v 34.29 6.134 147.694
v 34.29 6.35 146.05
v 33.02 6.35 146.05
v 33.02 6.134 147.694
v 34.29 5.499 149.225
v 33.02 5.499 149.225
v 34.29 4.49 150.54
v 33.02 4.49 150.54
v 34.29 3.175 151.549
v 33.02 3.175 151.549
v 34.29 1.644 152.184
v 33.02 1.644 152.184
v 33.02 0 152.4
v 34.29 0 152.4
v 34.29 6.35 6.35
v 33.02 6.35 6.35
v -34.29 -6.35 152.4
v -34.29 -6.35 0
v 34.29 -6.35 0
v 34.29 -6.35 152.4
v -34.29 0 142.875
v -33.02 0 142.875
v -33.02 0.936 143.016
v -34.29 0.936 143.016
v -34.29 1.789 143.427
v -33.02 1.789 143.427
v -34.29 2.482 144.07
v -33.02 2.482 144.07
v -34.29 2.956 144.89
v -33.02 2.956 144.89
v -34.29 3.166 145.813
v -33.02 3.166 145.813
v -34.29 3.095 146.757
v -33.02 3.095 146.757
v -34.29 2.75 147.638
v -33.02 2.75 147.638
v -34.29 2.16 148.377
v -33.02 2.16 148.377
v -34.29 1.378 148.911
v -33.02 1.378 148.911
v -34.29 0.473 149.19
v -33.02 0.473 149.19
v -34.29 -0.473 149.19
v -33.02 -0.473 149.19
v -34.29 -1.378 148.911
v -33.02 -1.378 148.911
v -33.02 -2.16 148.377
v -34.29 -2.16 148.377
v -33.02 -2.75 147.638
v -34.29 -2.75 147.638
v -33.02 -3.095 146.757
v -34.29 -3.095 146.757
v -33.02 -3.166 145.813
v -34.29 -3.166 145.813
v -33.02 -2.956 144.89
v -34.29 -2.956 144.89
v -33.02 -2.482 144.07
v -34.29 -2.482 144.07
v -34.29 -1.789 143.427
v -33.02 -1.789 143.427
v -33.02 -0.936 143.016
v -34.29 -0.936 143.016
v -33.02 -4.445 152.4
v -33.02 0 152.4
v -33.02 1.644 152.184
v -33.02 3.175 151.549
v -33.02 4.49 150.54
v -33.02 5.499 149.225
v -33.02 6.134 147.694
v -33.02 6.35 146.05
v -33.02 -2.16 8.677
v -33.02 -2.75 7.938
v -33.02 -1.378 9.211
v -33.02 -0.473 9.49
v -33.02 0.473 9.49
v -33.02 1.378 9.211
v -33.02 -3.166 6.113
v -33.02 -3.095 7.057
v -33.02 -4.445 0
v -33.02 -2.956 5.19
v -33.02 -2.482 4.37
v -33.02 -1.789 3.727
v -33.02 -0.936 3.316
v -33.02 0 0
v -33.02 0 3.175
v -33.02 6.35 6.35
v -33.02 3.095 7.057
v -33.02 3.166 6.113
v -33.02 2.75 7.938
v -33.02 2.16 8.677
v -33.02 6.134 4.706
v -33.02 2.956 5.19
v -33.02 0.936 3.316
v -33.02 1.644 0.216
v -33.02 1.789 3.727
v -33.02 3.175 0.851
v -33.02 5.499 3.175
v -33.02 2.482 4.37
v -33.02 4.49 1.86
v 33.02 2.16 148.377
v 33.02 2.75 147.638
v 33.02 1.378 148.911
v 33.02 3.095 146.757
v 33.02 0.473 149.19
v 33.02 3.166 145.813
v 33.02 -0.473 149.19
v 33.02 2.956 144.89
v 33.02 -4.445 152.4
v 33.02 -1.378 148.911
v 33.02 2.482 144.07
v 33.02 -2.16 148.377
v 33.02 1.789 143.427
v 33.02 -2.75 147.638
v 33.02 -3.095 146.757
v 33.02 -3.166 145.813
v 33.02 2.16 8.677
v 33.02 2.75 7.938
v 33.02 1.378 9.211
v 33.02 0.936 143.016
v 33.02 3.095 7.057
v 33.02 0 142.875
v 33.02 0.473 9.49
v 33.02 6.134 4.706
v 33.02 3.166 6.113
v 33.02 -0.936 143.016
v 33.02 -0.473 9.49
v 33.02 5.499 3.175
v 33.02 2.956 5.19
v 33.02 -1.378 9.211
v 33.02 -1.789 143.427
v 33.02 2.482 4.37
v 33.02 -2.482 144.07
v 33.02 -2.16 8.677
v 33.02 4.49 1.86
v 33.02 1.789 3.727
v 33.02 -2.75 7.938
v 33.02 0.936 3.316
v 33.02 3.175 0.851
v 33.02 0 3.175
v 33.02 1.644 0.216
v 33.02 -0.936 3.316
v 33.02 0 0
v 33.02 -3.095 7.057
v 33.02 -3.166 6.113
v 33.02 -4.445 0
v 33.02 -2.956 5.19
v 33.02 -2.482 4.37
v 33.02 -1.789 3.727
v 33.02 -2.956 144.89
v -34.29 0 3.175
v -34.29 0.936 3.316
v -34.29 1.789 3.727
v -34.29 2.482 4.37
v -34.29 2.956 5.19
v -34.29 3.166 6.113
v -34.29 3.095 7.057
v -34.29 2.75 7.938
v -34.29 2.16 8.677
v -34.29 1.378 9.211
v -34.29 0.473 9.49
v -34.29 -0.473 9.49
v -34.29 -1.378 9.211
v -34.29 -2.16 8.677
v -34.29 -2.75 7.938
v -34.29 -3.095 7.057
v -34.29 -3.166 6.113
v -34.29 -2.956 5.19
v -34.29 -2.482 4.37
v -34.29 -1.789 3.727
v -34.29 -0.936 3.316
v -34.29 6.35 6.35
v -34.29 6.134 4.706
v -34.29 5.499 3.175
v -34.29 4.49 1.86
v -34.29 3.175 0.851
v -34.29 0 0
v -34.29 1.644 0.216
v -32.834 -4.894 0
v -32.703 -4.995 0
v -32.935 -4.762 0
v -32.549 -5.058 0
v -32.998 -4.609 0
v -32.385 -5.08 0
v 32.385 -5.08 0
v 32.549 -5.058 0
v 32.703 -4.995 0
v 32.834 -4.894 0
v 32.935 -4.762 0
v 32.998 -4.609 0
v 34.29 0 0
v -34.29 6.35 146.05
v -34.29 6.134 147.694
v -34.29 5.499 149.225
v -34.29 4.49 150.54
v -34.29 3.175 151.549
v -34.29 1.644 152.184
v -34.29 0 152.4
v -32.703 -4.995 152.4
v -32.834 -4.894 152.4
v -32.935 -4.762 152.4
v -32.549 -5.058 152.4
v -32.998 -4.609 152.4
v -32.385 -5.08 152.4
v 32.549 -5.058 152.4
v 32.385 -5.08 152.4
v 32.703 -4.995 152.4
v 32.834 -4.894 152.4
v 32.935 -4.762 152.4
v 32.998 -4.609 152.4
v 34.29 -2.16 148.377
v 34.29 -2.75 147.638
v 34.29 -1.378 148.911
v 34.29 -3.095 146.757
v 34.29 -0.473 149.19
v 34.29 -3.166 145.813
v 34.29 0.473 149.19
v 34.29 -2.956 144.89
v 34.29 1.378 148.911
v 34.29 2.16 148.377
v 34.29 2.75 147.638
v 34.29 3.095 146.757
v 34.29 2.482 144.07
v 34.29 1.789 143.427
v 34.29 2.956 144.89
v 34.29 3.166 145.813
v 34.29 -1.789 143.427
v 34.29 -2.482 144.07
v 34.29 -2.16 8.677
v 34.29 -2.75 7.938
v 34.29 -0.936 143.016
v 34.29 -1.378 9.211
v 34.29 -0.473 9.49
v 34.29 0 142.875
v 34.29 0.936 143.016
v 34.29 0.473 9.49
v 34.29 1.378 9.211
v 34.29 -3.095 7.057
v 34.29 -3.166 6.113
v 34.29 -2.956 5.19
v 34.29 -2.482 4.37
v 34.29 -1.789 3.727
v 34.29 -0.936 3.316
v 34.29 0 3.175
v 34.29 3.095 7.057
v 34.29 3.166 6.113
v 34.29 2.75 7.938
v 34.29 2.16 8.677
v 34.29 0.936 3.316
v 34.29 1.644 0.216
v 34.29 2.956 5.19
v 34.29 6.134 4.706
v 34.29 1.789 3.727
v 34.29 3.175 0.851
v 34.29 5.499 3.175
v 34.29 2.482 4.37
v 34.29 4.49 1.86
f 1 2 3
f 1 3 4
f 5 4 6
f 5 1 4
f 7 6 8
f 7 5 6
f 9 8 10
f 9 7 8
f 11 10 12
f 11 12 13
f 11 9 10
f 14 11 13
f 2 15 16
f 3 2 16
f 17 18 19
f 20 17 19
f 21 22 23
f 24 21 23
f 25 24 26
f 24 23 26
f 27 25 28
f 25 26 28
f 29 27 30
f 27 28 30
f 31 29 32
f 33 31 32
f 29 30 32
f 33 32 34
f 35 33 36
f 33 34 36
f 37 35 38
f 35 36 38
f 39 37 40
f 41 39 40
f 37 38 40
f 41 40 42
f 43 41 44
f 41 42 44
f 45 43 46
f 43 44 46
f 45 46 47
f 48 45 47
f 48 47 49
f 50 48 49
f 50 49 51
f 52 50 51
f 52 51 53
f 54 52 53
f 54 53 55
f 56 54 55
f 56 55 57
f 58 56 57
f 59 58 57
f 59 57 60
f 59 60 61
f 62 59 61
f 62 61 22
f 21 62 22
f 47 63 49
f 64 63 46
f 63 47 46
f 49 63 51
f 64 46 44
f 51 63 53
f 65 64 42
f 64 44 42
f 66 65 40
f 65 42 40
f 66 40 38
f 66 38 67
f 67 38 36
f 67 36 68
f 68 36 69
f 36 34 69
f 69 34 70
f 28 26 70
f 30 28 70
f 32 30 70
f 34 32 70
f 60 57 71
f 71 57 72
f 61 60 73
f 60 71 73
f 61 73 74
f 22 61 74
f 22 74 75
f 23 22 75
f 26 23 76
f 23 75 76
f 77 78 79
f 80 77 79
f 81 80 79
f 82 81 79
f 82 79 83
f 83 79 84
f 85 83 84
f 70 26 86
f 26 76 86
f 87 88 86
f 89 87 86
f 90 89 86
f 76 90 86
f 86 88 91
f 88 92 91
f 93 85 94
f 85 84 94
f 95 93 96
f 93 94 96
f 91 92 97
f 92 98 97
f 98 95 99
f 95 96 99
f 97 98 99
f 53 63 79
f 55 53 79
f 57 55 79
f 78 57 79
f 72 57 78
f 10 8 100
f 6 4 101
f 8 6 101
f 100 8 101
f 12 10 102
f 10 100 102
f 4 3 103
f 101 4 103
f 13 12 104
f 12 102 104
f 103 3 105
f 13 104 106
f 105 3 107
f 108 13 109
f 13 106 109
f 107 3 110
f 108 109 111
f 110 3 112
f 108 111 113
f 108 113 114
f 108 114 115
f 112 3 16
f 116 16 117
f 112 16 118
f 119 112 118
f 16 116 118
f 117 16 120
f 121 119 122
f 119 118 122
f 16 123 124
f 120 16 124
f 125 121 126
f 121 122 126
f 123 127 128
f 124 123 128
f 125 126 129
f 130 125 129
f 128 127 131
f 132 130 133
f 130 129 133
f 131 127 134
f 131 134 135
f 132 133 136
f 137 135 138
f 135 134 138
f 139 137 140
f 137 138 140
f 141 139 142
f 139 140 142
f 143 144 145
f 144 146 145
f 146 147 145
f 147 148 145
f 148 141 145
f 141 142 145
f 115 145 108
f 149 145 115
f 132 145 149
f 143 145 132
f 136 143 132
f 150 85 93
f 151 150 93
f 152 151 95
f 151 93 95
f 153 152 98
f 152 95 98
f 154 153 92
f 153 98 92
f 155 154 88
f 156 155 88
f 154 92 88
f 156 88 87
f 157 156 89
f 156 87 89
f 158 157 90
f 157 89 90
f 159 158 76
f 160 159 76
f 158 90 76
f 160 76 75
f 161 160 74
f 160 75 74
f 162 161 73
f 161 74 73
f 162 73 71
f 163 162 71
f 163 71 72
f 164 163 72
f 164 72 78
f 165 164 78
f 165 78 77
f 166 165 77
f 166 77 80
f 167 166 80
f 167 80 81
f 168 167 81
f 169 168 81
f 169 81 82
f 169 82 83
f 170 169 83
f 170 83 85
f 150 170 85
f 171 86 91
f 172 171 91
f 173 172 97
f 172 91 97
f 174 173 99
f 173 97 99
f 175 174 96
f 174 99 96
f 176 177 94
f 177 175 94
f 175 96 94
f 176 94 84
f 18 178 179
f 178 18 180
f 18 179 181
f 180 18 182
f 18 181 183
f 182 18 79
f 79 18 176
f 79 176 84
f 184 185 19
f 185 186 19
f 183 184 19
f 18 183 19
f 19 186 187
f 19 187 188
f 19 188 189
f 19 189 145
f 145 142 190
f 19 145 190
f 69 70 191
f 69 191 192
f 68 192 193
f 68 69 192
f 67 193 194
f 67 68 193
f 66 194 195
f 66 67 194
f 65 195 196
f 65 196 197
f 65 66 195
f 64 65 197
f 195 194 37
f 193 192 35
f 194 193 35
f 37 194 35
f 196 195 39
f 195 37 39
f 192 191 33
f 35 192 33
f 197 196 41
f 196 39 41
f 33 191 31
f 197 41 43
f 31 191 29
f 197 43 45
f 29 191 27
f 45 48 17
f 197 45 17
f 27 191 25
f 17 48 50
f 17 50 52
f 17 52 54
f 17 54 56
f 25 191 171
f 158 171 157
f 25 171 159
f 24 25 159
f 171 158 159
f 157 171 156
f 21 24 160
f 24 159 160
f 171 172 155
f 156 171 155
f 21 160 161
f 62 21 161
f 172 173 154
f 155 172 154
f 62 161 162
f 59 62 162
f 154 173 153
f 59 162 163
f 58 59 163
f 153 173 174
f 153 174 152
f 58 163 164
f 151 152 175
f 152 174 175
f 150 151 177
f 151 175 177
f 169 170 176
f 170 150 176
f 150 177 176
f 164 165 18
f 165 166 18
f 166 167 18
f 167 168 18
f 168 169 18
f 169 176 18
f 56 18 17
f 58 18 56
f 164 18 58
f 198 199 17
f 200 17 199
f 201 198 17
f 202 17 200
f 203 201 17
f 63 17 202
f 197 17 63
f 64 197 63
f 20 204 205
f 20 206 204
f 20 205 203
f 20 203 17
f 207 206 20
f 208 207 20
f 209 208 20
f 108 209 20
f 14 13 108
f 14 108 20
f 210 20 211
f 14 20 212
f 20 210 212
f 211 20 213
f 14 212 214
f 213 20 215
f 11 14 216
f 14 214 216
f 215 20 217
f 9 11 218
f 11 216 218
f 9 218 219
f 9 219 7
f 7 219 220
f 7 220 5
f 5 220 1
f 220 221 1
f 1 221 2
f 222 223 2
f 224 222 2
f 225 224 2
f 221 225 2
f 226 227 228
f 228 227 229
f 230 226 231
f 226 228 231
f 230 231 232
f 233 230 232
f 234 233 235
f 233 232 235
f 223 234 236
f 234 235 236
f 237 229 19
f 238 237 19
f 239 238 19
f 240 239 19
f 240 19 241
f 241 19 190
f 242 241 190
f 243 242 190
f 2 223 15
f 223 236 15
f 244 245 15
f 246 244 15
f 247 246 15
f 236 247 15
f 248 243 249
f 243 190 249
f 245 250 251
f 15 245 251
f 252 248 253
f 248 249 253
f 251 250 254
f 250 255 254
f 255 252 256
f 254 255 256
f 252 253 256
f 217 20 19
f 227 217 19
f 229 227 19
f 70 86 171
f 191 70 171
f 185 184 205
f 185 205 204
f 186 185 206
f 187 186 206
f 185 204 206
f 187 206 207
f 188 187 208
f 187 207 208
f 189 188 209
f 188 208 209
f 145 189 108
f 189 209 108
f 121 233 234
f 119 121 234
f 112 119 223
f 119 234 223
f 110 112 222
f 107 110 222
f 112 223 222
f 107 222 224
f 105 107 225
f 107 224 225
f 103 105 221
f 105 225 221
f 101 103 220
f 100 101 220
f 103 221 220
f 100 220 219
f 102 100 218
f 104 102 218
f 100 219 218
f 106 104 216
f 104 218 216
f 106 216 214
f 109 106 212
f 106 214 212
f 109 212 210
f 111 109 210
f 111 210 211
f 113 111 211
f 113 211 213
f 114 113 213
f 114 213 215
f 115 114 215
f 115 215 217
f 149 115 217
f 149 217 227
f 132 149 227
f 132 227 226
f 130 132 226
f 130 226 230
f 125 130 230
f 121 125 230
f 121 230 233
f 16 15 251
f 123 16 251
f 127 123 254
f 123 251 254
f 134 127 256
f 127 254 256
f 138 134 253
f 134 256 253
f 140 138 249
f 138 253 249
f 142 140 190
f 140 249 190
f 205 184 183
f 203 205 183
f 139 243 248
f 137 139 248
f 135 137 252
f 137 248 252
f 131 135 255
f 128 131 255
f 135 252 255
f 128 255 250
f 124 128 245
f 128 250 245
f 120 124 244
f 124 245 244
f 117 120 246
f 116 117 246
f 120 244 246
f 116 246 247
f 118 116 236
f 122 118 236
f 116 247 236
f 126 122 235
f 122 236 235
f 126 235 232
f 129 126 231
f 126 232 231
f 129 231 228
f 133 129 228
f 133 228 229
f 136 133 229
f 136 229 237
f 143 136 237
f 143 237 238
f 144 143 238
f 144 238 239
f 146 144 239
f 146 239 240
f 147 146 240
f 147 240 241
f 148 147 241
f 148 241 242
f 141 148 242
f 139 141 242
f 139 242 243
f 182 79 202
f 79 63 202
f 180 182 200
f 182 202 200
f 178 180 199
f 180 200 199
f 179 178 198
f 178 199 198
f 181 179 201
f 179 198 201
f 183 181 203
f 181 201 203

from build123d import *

# Parameters (mm, degrees)
BOSS_EXTRUDE1_DEPTH = 152.4
SKETCH2_R           = 3.175
CUT_EXTRUDE1_DEPTH  = 69.58
FILLET1_R           = 0.635


with BuildPart() as part:
    # Sketch1 → Boss-Extrude1 (new body)
    with BuildSketch(Plane.XY):
        Polygon((-34.29, 6.35), (-34.29, -6.35), (34.29, -6.35), (34.29, 6.35), (33.02, 6.35), (33.02, -5.08), (-33.02, -5.08), (-33.02, 6.35), align=None)
    extrude(amount=BOSS_EXTRUDE1_DEPTH)

    # Sketch2 → Cut-Extrude1 (cut, through all)
    with BuildSketch(Plane(origin=(34.29, 0, 0), x_dir=(0, 0, -1), z_dir=(1, 0, 0))):
        with Locations((-146.05, 0)):
            Circle(SKETCH2_R)
        with Locations((-6.35, 0)):
            Circle(SKETCH2_R)
        with BuildLine():
            Line((-152.4, 0), (-152.4, 6.35))
            Line((-152.4, 6.35), (-146.05, 6.35))
            ThreePointArc((-146.05, 6.35), (-150.540128061, 4.490128061), (-152.4, 0))
        make_face()
        with BuildLine():
            Line((0, 0), (0, 6.35))
            Line((0, 6.35), (-6.35, 6.35))
            ThreePointArc((-6.35, 6.35), (-1.859871939, 4.490128061), (0, 0))
        make_face()
    extrude(amount=-CUT_EXTRUDE1_DEPTH, mode=Mode.SUBTRACT)

    # Fillet1
    fillet1_edges = [part.edges().sort_by_distance(p)[0] for p in [
        (-33.02, -5.08, 76.2),
        (33.02, -5.08, 76.2),
    ]]
    fillet(fillet1_edges, radius=FILLET1_R)


solid = part.part
